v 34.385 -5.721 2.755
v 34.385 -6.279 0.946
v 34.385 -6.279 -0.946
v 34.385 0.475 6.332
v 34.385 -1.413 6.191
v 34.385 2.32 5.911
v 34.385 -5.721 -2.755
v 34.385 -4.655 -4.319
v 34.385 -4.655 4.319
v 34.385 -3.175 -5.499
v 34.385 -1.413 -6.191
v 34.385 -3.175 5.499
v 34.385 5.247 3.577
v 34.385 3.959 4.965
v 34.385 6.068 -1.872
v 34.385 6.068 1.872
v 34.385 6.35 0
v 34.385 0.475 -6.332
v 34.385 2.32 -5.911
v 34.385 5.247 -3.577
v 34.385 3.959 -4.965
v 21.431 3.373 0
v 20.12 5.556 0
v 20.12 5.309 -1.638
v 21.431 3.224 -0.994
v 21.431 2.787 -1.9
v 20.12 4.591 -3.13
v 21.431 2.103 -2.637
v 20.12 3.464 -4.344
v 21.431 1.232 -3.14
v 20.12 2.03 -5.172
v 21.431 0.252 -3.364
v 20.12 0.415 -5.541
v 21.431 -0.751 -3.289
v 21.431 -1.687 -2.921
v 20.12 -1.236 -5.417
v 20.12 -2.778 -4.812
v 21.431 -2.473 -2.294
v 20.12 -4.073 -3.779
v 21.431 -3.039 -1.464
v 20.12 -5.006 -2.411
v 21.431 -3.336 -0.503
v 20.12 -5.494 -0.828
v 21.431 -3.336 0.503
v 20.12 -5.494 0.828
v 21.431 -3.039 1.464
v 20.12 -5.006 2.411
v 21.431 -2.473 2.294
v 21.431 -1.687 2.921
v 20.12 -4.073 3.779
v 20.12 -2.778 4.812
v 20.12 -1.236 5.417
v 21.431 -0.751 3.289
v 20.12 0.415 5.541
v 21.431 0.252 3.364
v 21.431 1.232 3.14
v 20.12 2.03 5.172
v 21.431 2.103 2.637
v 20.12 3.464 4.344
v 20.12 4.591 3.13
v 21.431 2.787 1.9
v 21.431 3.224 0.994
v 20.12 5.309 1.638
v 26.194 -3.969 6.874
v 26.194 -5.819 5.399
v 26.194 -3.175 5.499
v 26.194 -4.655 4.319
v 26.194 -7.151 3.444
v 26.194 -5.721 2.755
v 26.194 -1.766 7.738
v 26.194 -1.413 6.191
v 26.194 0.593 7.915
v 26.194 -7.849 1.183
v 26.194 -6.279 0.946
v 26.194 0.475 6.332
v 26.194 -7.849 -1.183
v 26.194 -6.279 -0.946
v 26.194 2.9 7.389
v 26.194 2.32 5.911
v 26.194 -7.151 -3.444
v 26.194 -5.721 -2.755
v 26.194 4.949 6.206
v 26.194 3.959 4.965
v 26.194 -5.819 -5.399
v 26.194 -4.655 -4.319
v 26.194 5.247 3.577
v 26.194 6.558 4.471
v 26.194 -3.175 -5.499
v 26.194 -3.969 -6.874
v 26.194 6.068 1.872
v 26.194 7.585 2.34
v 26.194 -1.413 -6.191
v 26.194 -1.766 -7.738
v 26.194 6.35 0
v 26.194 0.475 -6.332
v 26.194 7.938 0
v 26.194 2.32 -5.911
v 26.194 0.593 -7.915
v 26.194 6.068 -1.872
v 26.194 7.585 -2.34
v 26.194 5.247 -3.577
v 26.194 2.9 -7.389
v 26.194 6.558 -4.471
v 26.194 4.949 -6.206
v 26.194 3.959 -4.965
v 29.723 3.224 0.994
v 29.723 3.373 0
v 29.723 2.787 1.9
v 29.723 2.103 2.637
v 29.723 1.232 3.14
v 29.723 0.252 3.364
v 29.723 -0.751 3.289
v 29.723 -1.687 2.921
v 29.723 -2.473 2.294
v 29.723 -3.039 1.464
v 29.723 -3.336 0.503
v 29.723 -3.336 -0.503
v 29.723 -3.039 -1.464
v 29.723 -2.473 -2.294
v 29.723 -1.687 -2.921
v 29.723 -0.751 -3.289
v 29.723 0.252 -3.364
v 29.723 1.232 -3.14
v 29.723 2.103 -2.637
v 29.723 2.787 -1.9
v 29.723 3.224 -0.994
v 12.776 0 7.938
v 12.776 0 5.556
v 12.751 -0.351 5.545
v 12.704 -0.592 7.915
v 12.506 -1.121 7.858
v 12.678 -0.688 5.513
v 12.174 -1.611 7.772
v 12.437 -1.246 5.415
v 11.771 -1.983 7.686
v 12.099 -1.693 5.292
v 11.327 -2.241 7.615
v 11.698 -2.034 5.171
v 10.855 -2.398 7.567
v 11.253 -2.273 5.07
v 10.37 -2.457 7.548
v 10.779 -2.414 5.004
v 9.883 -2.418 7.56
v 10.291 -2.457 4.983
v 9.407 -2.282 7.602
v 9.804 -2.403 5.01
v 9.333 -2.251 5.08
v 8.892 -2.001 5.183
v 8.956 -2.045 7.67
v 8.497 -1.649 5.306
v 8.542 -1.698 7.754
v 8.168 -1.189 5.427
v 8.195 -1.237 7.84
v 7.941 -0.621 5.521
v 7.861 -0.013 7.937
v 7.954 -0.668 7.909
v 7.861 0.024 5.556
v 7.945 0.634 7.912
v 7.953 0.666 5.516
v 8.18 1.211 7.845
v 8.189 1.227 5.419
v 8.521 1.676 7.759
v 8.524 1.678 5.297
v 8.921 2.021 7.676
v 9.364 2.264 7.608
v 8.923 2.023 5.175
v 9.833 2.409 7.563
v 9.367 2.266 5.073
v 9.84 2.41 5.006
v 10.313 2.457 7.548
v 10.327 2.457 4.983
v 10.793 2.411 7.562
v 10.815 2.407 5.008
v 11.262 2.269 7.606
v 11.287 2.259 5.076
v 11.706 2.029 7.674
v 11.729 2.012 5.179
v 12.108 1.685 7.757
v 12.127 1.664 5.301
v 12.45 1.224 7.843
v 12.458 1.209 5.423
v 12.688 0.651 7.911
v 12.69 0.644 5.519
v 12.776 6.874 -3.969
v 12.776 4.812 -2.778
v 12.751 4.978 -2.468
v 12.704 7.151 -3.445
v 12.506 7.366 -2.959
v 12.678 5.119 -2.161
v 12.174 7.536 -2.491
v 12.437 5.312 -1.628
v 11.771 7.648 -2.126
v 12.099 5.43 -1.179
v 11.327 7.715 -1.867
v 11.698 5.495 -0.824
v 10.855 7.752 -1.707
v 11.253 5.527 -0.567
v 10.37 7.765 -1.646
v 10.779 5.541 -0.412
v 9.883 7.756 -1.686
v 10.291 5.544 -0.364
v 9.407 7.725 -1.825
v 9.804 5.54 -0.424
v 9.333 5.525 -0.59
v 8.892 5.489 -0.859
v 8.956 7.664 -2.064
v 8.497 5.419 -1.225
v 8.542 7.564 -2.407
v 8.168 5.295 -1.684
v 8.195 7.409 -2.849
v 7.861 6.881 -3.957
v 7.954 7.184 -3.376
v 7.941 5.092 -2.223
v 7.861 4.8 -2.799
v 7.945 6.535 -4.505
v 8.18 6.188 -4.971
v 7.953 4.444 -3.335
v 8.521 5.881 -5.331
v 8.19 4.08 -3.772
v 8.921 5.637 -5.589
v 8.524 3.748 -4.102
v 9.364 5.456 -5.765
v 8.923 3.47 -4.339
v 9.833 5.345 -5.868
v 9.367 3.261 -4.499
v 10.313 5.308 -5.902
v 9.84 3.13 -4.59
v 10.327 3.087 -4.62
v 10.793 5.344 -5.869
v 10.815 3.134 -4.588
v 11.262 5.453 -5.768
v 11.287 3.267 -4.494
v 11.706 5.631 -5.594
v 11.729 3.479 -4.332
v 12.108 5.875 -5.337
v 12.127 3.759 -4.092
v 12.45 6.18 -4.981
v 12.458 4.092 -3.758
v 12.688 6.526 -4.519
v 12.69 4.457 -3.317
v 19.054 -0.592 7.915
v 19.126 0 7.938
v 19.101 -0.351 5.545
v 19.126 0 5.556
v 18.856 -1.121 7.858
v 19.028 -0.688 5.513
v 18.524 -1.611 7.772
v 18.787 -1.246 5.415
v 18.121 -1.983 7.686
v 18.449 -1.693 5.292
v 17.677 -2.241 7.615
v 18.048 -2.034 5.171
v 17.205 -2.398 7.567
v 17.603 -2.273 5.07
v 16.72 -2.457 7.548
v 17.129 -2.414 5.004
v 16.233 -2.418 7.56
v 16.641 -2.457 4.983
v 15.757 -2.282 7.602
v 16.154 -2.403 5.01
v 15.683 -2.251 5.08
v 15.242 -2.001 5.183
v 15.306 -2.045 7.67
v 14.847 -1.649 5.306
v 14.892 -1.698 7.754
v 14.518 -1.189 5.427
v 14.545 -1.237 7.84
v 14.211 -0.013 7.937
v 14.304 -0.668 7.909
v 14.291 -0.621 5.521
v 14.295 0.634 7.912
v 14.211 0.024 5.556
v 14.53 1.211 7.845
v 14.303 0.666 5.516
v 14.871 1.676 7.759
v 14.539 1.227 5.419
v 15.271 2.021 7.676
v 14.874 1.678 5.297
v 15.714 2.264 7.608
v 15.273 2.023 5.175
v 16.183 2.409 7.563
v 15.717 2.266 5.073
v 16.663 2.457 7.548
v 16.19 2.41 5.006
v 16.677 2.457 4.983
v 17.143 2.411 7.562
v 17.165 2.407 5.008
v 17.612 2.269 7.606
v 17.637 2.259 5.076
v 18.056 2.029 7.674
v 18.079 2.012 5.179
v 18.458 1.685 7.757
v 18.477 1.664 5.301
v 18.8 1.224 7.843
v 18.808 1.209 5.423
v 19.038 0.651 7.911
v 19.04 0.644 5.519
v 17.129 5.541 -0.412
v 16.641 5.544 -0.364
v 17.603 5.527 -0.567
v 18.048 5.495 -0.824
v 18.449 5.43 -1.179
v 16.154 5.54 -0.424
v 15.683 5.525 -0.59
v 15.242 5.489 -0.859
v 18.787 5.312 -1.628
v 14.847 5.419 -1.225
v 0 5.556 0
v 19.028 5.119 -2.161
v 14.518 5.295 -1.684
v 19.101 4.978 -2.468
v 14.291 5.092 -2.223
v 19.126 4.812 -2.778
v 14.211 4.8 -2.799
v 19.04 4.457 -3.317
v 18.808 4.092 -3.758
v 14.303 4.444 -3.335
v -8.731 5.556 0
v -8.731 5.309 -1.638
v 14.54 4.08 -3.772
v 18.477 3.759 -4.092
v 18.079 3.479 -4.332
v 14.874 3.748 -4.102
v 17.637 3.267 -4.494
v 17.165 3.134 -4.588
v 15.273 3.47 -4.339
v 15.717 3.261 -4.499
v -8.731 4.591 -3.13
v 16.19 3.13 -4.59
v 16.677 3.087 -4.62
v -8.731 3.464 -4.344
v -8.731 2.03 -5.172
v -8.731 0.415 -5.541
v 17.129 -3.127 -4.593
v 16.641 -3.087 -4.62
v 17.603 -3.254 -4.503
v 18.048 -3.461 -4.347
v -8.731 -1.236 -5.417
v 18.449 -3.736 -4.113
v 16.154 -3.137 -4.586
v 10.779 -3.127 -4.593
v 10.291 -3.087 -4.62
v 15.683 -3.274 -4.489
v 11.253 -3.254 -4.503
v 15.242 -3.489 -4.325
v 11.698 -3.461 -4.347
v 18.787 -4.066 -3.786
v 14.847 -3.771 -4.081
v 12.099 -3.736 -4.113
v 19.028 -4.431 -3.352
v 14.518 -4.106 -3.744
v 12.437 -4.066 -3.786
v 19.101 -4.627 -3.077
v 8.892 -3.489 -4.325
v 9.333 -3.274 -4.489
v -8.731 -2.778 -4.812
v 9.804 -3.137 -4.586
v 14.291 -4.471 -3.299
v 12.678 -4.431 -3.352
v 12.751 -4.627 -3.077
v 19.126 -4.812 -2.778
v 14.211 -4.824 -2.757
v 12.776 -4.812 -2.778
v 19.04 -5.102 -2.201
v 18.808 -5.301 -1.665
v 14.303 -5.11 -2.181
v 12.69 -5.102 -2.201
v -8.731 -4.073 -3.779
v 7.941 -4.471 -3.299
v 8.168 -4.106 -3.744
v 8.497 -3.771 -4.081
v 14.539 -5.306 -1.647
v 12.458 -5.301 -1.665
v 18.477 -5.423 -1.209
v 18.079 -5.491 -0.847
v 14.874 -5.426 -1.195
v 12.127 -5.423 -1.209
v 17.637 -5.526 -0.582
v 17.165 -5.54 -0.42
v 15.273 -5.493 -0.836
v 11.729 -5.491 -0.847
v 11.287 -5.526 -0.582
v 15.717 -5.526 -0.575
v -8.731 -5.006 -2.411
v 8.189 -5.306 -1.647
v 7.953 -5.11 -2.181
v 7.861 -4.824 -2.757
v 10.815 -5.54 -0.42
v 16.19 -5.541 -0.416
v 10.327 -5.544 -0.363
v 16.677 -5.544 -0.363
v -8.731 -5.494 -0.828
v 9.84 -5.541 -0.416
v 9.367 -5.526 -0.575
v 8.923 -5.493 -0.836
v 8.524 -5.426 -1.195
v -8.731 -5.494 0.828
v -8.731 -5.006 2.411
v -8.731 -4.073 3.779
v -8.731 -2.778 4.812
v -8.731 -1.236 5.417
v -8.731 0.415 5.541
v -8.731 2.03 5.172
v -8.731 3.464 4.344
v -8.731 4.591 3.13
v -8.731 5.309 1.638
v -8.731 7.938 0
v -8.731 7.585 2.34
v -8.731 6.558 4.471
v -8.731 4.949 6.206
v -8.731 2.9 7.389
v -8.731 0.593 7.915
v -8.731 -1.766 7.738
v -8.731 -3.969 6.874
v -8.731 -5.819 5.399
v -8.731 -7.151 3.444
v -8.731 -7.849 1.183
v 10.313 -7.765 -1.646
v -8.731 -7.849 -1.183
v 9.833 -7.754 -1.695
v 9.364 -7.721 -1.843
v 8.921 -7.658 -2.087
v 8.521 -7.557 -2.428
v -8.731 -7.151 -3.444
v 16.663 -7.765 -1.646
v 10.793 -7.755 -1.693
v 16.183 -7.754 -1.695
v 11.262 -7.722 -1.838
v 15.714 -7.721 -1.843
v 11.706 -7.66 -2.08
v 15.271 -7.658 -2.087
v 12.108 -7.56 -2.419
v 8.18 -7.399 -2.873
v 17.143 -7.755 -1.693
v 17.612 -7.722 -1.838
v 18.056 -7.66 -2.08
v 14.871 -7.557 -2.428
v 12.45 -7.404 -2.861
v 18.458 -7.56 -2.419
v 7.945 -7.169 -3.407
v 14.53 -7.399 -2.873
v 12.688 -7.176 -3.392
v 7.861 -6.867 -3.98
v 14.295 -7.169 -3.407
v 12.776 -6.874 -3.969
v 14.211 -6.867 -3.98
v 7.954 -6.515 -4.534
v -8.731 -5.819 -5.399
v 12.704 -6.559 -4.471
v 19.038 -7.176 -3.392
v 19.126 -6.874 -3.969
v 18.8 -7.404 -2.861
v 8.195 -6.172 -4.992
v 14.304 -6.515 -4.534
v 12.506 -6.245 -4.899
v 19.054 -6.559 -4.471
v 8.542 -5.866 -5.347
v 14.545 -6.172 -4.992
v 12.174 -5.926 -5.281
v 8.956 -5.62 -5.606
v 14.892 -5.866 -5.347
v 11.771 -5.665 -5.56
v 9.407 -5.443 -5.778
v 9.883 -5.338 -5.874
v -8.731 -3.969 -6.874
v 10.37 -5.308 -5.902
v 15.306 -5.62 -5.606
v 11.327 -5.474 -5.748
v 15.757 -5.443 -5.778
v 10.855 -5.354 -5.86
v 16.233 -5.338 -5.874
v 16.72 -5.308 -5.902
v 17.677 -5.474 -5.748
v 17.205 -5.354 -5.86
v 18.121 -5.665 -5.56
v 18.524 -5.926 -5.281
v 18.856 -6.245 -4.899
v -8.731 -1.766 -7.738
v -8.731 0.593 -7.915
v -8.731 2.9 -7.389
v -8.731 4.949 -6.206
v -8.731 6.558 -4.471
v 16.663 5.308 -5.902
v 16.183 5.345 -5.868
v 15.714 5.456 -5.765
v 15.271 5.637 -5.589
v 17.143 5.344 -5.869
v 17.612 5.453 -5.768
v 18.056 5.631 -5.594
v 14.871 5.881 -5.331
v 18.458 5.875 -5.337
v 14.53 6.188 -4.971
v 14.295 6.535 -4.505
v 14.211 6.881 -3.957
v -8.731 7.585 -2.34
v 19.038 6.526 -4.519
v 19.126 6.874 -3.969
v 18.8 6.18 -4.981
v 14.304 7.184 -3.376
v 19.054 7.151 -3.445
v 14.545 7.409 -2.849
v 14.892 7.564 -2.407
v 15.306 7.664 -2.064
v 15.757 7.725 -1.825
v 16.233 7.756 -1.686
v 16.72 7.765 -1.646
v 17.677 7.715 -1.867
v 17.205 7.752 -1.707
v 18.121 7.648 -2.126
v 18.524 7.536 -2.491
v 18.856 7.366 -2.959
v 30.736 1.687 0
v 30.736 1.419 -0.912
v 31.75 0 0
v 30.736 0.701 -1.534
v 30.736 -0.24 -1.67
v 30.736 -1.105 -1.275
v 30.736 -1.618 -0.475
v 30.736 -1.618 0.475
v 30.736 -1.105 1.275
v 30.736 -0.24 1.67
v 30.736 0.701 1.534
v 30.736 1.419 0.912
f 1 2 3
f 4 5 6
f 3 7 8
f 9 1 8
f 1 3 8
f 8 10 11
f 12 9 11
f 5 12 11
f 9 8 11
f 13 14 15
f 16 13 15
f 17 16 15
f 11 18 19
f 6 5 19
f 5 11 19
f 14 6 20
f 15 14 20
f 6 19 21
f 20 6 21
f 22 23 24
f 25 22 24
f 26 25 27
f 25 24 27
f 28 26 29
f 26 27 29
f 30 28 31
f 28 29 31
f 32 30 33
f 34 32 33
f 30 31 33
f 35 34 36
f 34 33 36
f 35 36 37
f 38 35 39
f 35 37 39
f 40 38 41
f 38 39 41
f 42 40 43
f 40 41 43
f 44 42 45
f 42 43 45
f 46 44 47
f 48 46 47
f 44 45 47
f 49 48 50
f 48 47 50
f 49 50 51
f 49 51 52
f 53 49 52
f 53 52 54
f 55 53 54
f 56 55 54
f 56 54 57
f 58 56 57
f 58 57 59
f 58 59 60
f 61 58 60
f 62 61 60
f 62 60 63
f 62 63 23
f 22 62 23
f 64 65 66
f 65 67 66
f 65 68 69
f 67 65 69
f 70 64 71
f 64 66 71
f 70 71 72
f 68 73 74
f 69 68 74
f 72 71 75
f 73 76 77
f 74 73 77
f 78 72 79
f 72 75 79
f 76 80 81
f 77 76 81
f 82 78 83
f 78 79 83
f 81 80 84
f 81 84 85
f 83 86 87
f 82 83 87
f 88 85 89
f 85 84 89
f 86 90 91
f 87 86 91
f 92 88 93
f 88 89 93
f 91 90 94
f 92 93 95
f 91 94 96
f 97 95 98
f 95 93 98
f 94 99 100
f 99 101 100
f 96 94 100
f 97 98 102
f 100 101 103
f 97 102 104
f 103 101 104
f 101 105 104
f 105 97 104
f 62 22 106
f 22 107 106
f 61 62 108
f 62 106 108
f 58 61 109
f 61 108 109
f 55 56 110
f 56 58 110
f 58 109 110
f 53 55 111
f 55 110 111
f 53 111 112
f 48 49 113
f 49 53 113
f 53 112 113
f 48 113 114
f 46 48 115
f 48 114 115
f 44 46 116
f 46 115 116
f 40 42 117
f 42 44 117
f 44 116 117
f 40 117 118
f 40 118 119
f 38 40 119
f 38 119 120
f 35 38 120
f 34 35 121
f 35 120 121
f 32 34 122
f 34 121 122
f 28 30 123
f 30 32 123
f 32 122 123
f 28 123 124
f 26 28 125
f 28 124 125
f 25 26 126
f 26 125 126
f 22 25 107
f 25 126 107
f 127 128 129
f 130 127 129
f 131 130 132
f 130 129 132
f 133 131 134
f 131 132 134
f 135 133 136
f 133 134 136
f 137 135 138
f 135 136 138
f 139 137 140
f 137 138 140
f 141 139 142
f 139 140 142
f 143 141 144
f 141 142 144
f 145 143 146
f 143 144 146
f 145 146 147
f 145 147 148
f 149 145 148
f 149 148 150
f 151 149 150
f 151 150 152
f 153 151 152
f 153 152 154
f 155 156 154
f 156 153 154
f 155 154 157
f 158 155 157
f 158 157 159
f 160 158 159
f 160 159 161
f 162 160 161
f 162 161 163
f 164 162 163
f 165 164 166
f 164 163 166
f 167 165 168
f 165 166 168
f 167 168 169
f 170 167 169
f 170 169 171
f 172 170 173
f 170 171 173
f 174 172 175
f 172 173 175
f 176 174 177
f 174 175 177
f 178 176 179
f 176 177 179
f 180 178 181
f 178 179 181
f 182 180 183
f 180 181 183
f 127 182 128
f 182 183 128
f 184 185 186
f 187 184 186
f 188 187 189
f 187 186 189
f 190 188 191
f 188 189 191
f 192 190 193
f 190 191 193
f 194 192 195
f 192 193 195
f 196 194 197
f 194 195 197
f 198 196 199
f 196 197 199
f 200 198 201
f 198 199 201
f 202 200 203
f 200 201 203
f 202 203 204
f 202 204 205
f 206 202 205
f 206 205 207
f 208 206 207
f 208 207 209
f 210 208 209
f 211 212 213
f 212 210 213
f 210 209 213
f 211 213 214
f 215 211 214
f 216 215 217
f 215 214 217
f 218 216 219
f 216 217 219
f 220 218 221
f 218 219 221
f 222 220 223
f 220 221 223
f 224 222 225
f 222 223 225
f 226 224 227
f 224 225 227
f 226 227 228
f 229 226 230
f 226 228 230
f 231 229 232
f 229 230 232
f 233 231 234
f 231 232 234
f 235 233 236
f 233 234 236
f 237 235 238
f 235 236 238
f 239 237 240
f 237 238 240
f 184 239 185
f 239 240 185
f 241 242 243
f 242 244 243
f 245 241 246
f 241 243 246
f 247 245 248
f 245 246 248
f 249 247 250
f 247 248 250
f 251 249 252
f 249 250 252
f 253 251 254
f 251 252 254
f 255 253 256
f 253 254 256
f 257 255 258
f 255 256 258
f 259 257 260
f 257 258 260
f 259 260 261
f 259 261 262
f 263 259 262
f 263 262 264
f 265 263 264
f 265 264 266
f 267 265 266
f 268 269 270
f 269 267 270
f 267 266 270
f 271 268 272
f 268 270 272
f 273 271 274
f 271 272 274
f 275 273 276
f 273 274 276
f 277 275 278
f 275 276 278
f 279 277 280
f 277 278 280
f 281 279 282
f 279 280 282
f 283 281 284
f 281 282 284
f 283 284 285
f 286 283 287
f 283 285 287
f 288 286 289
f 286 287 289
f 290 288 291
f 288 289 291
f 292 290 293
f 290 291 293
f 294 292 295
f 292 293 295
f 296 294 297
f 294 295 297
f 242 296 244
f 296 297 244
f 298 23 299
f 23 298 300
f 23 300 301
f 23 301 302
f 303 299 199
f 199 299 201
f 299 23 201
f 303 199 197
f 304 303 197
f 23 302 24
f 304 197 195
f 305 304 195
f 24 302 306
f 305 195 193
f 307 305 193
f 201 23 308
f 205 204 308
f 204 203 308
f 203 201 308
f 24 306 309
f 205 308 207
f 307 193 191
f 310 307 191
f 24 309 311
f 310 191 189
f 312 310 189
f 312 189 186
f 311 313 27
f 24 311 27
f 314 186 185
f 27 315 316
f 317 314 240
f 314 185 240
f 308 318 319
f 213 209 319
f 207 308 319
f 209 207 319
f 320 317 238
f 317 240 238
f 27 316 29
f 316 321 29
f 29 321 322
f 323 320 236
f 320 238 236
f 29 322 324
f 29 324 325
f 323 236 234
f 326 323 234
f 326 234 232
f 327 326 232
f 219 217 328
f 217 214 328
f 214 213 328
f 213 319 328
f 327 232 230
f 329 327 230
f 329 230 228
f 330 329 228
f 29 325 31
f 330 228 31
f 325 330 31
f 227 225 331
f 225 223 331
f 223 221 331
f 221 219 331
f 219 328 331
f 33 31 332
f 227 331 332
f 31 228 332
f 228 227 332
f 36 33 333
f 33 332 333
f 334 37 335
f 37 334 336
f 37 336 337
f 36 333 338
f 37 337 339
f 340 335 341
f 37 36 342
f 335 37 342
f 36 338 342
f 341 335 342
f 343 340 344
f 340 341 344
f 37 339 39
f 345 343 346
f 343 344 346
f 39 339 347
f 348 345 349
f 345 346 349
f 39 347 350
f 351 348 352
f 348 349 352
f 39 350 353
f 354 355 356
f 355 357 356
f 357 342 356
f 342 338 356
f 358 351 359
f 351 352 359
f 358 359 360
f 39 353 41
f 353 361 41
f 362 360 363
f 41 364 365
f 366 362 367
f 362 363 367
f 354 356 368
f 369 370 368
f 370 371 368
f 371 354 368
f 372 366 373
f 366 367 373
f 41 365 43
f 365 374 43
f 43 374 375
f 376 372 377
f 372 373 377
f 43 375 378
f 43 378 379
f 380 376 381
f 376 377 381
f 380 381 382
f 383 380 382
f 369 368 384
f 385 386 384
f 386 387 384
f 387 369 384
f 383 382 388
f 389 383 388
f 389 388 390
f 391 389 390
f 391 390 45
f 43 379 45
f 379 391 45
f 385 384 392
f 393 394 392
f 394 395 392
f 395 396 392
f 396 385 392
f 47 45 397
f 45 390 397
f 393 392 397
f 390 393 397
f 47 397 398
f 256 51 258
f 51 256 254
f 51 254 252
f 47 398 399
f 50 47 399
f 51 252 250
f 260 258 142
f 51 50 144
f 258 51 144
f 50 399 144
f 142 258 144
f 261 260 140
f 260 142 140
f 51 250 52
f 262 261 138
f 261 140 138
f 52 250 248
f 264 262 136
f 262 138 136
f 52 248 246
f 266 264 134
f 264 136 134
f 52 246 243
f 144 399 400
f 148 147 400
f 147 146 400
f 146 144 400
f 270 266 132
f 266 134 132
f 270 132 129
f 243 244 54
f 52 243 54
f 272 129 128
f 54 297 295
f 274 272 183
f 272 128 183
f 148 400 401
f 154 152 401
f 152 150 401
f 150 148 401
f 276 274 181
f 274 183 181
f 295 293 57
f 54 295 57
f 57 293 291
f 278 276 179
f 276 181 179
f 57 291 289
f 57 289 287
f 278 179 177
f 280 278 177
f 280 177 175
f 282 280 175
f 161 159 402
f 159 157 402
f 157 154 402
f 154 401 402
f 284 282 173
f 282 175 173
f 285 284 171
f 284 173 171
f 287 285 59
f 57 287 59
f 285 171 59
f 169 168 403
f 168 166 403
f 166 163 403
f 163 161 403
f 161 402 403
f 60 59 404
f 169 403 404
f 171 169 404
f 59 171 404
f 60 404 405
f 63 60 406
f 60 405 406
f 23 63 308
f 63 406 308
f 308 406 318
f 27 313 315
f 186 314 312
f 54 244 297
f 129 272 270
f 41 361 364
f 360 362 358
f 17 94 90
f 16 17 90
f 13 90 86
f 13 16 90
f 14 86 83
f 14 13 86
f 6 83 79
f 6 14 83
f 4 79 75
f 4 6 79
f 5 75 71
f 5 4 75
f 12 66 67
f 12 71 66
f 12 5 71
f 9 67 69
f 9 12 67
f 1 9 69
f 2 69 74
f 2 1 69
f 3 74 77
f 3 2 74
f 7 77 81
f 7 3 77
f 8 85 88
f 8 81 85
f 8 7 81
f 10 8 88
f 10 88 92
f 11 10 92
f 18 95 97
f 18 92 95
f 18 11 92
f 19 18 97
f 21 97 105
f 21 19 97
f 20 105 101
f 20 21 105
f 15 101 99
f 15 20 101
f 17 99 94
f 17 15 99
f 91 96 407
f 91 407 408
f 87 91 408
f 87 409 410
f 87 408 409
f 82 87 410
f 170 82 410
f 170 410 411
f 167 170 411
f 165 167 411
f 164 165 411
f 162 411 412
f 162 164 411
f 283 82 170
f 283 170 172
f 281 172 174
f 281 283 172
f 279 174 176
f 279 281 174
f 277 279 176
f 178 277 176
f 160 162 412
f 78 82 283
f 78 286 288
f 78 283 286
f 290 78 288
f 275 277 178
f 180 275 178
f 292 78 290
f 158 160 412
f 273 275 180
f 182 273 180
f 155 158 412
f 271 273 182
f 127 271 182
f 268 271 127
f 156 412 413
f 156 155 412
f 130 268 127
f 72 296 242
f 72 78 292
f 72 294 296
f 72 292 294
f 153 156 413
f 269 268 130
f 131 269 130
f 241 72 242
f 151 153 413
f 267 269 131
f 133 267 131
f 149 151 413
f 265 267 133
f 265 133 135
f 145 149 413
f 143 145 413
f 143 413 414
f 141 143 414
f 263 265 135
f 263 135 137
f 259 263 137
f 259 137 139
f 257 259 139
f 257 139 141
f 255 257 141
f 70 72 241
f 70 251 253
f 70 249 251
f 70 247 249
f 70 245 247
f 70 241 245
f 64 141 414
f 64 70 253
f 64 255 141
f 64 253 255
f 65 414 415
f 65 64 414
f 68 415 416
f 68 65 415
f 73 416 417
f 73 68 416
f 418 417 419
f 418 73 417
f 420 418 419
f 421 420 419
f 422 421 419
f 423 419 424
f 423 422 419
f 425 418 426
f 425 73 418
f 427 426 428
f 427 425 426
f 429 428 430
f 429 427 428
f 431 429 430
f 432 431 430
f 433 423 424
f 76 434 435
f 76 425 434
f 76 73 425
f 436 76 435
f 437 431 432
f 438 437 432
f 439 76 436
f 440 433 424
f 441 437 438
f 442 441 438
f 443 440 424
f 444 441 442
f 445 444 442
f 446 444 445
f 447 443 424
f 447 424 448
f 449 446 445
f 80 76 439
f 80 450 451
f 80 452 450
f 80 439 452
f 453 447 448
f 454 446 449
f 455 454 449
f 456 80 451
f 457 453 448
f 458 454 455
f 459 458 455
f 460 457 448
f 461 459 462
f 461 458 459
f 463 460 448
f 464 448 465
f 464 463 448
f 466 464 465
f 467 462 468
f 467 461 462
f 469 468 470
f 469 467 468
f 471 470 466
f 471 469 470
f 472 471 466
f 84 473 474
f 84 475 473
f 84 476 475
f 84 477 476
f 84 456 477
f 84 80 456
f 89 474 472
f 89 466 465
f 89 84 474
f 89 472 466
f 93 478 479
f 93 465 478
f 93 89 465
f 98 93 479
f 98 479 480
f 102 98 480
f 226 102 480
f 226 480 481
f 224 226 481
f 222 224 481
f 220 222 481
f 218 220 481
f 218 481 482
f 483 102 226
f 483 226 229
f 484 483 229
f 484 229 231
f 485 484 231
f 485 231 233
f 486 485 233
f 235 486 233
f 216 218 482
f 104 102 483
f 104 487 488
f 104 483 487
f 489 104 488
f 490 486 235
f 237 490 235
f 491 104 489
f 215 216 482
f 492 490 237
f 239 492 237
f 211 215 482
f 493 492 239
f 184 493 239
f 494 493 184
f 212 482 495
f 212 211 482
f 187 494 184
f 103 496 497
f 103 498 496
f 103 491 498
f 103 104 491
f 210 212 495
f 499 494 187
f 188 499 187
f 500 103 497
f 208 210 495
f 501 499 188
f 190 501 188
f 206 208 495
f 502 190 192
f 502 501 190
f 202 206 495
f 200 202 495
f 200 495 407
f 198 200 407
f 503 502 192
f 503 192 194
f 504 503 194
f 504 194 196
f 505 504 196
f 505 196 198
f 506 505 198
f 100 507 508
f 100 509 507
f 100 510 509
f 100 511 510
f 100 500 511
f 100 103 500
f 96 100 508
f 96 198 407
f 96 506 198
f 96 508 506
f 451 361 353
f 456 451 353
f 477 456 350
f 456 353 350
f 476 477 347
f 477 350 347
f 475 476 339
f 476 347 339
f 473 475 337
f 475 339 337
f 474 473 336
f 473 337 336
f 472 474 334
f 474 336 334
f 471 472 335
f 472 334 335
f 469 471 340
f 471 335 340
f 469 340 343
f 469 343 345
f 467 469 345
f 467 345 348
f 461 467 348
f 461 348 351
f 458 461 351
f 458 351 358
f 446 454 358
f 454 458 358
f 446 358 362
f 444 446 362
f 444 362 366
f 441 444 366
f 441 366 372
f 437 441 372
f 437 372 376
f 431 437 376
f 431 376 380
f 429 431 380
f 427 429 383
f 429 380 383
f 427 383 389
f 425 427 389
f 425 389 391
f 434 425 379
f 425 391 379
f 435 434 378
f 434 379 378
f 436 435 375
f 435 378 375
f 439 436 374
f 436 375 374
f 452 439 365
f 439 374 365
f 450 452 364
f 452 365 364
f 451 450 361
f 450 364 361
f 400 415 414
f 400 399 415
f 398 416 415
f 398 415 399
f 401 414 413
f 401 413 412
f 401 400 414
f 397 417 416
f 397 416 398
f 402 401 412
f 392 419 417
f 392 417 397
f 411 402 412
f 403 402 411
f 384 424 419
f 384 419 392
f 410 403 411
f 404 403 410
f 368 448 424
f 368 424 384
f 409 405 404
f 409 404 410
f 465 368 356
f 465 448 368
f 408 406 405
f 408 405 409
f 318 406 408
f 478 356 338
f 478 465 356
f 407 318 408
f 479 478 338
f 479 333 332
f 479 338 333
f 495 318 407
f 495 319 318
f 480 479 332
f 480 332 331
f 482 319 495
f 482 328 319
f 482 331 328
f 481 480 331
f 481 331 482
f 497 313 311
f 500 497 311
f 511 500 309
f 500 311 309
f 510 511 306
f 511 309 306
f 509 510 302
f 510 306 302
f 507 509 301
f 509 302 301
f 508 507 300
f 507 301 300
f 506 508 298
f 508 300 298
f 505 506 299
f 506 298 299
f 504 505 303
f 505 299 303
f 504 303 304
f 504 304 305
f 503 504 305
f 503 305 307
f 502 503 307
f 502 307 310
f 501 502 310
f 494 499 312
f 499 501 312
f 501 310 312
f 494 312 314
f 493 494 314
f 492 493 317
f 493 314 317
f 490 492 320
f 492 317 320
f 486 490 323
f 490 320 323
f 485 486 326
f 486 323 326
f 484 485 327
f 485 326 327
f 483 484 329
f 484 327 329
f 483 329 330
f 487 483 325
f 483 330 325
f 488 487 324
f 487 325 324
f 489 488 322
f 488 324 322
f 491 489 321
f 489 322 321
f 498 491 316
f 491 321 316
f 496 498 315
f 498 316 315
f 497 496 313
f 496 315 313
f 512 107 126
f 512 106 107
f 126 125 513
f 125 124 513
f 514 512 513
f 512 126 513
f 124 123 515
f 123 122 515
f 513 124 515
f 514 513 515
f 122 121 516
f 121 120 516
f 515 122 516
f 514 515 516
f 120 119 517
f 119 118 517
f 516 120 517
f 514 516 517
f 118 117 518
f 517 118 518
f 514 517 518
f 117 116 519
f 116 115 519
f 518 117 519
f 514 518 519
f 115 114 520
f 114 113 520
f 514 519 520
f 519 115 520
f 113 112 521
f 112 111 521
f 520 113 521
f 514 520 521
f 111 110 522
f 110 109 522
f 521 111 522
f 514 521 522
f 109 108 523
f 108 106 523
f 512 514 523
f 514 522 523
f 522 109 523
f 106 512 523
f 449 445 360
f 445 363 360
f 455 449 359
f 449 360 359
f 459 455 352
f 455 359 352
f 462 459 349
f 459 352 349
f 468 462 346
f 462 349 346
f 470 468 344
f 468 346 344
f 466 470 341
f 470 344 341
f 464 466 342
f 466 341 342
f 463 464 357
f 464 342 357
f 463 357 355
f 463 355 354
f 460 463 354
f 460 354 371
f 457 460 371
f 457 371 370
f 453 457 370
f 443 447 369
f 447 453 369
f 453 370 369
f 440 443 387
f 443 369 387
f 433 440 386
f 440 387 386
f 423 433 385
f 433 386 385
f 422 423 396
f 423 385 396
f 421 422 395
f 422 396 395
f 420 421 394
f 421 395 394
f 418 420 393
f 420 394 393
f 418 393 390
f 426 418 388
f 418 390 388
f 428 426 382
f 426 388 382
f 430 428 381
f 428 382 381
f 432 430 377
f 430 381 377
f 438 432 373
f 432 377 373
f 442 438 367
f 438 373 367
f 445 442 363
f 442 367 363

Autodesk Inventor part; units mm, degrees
ref_plane "YZ Plane" through (0, 0, 0) normal (1, 0, 0) x (0, 1, 0)
ref_plane "XZ Plane" through (0, 0, 0) normal (0, 1, 0) x (-1, 0, 0)
ref_plane "XY Plane" through (0, 0, 0) normal (0, 0, 1) x (1, 0, 0)
sketch "Sketch4" plane through (0, 0, 0) normal (0, 0, 1) x (1, 0, 0)
  line L0 (0, 0) -> (0, 5.5562) construction
  line L1 (0, 5.5562) -> (20.1197, 5.5563)
  line L2 (0, 7.9375) -> (26.1937, 7.9375)
  line L3 (26.1937, 7.9375) -> (26.1937, 6.35)
  line L4 (26.1937, 5.5563) -> (26.1937, 0) construction
  line L5 (26.1937, 0) -> (0, 0) construction
  line L6 (26.1937, 6.35) -> (34.3852, 6.35)
  line L7 (26.1937, 0) -> (31.75, 0) construction
  line L8 (34.3852, 0) -> (34.3852, 6.35)
  line L9 (16.6687, 7.9375) -> (16.6687, 0) construction
  circle A0 centre (16.6687, 7.5565) radius 2.3813 construction
  circle A1 centre (16.6687, 5.4928) radius 2.3813 construction
  circle A2 centre (10.3187, 7.5565) radius 2.3813 construction
  circle A3 centre (10.3187, 5.4928) radius 2.3813 construction
  line L10 (10.3187, 7.9375) -> (10.3187, 0) construction
  line L11 (0, 5.1753) -> (26.1938, 5.1753) construction
  line L12 (8.7312, 5.1753) -> (8.7312, 0) construction
  line L13 (5.5562, 5.1753) -> (5.5562, 0) construction
  line L14 (18.2563, 5.1753) -> (18.2562, 0) construction
  line L15 (21.4313, 5.1753) -> (21.4312, 0) construction
  line L16 (0, 3.1115) -> (26.1937, 3.1115) construction
  line L17 (5.5562, 3.1115) -> (8.7312, 5.1753) construction
  line L18 (18.2563, 5.1753) -> (21.4312, 3.1115) construction
  line L19 (11.9062, 5.1753) -> (11.9062, 0) construction
  line L20 (15.0812, 5.1753) -> (15.0812, 0) construction
  line L21 (11.9062, 5.1753) -> (15.0812, 3.1115) construction
  line L22 (21.4312, 3.3734) -> (29.723, 3.3734)
  line L23 (24.6062, 3.3734) -> (24.6062, 0) construction
  line L24 (21.4312, 3.3734) -> (20.1197, 5.5563)
  line L25 (26.1937, 3.1115) -> (30.9562, 3.1115) construction
  line L26 (30.9562, 3.1115) -> (30.9562, 0) construction
  line L27 (31.75, 3.3734) -> (31.75, 0) construction
  line L28 (31.75, 0) -> (29.723, 3.3734)
  line L29 (0, 7.9375) -> (-1.5875, 7.9375) construction
  line L30 (-1.5875, 7.9375) -> (-1.5875, 3.3734) construction
  line L31 (-1.5875, 3.3734) -> (5.5562, 3.3734) construction
  line L32 (0, 5.5562) -> (0, 7.9375)
  line L33 (0, 7.9375) -> (0, 12.7) construction
  line L34 (20.1197, 5.5563) -> (26.1937, 5.5563) construction
  line L35 (29.723, 3.3734) -> (34.3852, 3.3734) construction
  line L36 (26.1937, 6.35) -> (26.1937, 5.5563) construction
  line L37 (31.75, 0) -> (34.3852, 0)
  line L38 (0, 5.5562) -> (-8.7313, 5.5563)
  line L39 (-8.7313, 5.5563) -> (-8.7313, 7.9375)
  line L40 (-8.7313, 7.9375) -> (0, 7.9375)
  line L41 (-8.7313, 6.35) -> (0, 6.35)
  dimension "d16" = 12.7
  dimension "d17" = 5.5563
  dimension "d18" = 7.9375
  dimension "d19" = 26.1938
  dimension "d20" = 8.1915
  dimension "d21" = 6.35
  dimension "d22" = 9.525
  dimension "d23" = 6.35
  dimension "d24" = 0.381
  dimension "d25" = 0.381
  dimension "d26" = 0.0635
  dimension "d27" = 0.0635
  dimension "d28" = 1.5875
  dimension "d29" = 4.7625
  dimension "d30" = 1.5875
  dimension "d31" = 4.7625
  dimension "d32" = 3.1115
  dimension "d33" = 1.5875
  dimension "d34" = 4.7625
  dimension "d35" = 3.3734
  dimension "d36" = 3.175
  dimension "d37" = 31
  dimension "d38" = 9.525
  dimension "d39" = 9.525
  dimension "d40" = 0.7937
  dimension "d41" = 31
  dimension "d42" = 1.5875
  dimension "d43" = 3.3734
  dimension "d49" = 4.7625
  dimension "d63" = 8.7312
  dimension "d64" = 6.35
revolve "Revolution1" add sketch "Sketch4" angle 360 about axis through (26.1937, 0, 0) along (-1, 0, 0)
sketch "Sketch5" plane through (0, 0, 0) normal (0, 0, 1) x (1, 0, 0)
  line L0 (26.1937, -7.9375) -> (26.1937, 7.9375) projected
  line L1 (0, 0) -> (26.1937, 0) construction
  circle A0 centre (16.6687, 0) radius 2.4574
  circle A1 centre (10.3187, 0) radius 2.4574
  dimension "d51" = 4.9149
  dimension "d53" = 6.35
  dimension "d54" = 9.525
  dimension "d55" = 4.9149
extrude "Extrusion4" cut sketch "Sketch5" along normal through all
pattern_circular "Circular Pattern2" count 3 over 360 about axis through (-4.3656, 0, 0) along (1, 0, 0) of "Extrusion4"
ref_plane "Work Plane1" through (16.6687, 0, 0) normal (1, 0, 0) x (0, 0, -1)
ref_plane "Work Plane2" through (10.3187, 0, 0) normal (1, 0, 0) x (0, 0, -1)
equation "\"d17\" = d44"
equation "\"d18\" = d45"
equation "\"d24\" = d46"
equation "\"d25\" = d24"
equation "\"d26\" = d47"
equation "\"d27\" = d26"
equation "\"d32\" = d48"
equation "\"d33\" = d28"
equation "\"d34\" = d29"
equation "\"d39\" = d38"
equation "\"d41\" = d37"
equation "\"d43\" = d35"
equation "\"d55\" = d51"
equation "\"d44\" = 5.55625"
equation "\"d45\" = 7.9375"
equation "\"d46\" = 0.381"
equation "\"d47\" = 0.0635"
equation "\"d48\" = 3.1115"
properties part number "Output SHaft"
